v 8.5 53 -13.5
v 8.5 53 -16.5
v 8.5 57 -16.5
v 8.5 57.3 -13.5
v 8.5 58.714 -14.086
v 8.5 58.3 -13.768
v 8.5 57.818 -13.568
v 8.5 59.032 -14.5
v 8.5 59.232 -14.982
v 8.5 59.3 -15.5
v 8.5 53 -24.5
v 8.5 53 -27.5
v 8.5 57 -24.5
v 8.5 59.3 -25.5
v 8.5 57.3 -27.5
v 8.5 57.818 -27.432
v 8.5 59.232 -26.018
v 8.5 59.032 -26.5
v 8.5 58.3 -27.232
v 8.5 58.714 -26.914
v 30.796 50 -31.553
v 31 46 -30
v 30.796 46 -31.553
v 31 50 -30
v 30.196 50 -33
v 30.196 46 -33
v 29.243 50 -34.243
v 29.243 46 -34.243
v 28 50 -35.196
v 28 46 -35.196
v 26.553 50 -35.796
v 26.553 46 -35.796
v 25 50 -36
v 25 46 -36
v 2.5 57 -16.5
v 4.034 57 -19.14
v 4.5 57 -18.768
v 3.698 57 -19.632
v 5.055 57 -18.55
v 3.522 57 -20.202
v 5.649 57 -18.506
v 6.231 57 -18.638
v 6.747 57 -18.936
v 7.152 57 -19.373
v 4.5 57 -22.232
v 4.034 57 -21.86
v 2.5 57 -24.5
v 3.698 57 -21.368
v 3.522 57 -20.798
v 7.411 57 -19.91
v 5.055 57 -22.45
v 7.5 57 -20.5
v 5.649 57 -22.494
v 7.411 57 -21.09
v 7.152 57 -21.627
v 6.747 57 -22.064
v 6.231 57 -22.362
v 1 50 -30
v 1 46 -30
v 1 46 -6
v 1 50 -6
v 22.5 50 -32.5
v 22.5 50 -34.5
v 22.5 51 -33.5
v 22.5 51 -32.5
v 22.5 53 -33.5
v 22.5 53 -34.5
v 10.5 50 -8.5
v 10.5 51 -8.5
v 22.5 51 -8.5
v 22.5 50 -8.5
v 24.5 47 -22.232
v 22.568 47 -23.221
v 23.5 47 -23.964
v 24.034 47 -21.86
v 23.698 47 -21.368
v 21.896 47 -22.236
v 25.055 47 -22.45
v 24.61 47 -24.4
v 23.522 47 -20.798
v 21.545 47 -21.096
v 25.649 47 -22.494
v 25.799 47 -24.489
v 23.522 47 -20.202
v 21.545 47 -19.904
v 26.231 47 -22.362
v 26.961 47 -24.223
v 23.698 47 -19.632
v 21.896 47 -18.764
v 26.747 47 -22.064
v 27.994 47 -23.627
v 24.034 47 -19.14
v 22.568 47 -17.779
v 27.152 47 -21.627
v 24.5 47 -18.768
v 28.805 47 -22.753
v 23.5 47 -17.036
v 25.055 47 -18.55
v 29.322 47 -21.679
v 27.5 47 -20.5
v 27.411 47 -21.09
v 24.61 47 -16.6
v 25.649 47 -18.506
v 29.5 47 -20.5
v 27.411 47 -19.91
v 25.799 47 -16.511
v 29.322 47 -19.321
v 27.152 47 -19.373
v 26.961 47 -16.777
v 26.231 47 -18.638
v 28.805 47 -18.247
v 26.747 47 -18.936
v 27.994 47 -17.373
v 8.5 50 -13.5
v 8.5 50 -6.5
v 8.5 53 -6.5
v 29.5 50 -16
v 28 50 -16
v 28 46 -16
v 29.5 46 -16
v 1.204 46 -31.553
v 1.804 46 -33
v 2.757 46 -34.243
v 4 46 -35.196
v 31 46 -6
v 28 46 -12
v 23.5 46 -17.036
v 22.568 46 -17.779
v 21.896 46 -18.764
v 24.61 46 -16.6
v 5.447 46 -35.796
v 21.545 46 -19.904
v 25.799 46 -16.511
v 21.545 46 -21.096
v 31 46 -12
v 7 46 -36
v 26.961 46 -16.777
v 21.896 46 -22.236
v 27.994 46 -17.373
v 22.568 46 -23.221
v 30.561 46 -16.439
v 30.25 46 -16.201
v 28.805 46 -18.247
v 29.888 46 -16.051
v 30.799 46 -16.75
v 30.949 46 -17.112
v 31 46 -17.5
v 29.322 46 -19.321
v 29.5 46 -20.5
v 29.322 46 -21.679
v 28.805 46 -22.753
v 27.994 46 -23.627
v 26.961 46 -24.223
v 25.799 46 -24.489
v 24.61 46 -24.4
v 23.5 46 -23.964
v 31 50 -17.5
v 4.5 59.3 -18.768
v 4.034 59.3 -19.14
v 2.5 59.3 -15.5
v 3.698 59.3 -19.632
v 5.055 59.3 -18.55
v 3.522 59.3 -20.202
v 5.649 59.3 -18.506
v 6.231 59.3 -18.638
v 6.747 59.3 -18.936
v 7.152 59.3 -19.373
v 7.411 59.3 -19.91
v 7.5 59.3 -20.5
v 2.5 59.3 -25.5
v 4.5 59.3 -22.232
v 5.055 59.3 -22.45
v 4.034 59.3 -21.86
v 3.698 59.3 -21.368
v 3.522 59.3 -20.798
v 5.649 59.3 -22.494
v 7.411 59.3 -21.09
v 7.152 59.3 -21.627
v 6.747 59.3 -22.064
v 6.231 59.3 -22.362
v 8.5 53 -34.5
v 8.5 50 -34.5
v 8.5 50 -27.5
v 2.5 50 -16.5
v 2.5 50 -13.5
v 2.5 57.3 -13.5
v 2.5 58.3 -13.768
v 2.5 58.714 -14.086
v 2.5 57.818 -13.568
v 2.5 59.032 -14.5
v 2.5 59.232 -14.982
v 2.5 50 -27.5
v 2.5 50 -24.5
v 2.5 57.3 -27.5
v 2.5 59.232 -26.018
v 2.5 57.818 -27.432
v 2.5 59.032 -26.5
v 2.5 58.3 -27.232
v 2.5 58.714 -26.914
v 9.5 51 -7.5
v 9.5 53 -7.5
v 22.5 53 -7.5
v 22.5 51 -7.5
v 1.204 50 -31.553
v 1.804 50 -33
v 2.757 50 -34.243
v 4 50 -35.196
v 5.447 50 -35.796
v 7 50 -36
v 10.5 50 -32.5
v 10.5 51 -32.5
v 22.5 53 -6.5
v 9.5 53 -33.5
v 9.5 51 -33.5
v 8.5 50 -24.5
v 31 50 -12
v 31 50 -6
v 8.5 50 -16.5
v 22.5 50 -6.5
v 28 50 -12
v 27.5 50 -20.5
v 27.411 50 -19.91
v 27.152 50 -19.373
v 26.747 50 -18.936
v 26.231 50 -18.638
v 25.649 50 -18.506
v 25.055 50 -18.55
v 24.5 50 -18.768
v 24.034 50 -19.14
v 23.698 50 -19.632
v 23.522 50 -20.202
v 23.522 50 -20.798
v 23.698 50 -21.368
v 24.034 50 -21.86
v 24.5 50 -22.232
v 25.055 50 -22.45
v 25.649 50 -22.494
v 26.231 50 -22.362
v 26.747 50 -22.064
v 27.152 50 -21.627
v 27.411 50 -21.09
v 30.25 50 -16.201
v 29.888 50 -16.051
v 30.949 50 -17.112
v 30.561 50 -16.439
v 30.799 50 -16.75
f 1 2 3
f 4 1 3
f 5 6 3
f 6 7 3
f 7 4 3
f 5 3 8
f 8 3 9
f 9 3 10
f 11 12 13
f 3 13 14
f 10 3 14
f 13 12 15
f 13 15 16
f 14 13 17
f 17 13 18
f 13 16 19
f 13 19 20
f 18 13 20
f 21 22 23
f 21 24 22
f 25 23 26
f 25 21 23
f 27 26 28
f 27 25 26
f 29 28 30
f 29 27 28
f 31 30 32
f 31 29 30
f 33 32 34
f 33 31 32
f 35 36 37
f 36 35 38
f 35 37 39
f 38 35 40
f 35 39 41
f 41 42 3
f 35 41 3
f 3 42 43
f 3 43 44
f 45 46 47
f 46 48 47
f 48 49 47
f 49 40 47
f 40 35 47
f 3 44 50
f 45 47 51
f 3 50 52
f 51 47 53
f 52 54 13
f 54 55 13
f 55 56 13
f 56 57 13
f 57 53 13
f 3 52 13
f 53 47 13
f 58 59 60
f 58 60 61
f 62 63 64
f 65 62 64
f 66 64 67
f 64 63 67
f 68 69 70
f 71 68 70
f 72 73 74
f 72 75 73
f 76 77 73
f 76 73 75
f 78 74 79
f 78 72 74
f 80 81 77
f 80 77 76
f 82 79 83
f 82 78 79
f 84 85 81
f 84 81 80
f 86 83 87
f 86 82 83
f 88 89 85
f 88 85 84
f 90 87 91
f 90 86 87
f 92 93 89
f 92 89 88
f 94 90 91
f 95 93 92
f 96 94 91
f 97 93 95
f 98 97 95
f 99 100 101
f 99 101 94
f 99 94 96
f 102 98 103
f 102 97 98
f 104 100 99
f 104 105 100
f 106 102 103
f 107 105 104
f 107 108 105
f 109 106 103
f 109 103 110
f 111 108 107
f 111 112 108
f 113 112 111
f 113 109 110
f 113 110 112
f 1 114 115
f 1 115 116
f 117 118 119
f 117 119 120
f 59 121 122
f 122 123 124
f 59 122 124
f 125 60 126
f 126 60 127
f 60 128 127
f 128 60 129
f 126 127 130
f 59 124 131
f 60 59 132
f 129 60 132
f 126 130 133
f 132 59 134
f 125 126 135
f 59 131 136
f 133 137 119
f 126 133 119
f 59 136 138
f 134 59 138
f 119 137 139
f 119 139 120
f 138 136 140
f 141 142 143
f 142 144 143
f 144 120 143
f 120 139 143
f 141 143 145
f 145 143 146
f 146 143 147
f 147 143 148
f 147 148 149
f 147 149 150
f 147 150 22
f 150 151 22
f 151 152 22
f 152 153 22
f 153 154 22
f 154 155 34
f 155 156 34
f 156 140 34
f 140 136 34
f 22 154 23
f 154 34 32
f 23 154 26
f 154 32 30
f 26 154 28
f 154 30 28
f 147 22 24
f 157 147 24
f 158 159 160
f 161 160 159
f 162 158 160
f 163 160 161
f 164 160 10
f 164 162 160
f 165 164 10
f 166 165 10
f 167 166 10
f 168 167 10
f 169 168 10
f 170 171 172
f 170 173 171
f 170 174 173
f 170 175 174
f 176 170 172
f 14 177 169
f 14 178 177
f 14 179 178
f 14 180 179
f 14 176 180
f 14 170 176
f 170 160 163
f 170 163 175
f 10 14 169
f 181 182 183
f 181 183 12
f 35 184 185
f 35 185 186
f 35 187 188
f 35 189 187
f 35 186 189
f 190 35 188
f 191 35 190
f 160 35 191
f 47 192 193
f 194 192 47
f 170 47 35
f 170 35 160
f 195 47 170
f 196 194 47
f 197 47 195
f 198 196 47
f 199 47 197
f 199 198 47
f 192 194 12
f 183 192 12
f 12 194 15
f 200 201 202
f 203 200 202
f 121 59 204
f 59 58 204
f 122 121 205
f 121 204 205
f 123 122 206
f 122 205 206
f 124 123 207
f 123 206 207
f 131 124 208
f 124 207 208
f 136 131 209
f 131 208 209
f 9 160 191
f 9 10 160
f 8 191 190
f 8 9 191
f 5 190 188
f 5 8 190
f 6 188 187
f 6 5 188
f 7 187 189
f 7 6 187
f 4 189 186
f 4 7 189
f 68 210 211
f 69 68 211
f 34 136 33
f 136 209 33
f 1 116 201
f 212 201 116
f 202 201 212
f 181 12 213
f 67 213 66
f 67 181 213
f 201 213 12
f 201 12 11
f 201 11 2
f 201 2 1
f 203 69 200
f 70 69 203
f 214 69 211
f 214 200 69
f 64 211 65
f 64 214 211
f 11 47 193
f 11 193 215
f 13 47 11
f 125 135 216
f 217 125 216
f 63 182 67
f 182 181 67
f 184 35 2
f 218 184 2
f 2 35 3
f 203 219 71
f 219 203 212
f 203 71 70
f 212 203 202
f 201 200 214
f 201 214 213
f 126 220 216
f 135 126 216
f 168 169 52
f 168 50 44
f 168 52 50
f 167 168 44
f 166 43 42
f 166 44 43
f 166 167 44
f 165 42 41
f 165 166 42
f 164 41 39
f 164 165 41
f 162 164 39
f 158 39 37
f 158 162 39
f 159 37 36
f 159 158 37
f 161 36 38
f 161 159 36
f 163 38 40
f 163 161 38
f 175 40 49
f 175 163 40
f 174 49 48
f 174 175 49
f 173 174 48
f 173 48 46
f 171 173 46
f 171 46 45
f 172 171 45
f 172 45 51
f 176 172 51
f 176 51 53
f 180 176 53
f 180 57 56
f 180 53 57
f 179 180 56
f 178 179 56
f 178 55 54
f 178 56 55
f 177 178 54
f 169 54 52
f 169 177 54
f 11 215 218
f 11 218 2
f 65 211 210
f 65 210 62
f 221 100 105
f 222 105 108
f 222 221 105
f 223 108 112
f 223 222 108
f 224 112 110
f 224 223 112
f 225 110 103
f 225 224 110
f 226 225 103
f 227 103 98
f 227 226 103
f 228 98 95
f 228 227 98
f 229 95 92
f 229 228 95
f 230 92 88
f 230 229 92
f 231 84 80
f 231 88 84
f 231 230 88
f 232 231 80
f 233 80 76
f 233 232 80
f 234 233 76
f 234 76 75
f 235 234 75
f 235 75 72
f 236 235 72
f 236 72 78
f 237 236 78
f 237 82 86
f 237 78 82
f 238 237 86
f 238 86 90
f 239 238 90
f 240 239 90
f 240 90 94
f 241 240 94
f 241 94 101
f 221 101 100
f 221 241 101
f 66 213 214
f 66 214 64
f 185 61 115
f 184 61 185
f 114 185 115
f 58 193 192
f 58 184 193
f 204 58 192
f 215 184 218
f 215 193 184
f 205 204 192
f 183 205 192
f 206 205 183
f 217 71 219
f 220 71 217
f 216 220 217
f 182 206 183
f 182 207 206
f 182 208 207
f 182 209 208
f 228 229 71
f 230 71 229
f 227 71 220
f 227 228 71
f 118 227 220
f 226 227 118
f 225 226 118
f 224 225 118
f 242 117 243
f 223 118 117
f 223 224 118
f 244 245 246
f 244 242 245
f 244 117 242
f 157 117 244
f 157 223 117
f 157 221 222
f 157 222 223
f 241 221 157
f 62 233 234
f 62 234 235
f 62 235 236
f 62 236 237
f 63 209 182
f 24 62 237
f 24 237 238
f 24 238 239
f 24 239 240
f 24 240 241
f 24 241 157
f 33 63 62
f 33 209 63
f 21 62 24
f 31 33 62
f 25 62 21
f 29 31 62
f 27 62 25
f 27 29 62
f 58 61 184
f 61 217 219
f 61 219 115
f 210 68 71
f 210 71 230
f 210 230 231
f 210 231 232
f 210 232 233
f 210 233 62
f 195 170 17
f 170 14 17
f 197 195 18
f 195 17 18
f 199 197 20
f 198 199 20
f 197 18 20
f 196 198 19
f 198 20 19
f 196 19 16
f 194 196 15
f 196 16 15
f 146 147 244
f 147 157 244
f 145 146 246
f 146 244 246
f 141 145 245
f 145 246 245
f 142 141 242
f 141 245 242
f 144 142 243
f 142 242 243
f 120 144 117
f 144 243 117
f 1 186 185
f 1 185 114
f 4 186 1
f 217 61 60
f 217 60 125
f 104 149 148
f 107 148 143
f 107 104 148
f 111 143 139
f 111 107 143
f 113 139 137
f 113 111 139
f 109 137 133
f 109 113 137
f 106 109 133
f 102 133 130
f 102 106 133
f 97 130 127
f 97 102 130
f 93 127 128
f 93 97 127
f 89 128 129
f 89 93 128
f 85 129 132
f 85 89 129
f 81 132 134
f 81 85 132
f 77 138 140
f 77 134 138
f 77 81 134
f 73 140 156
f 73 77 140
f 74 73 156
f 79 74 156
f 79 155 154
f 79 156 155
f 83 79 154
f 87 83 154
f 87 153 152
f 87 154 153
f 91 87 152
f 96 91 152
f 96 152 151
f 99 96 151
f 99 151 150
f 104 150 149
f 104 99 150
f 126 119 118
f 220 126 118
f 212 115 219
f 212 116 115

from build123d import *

# Parameters (mm, degrees)
BOX227_W          = 10
BOX227_H          = 10
BOX227_DEPTH      = 4
BOX217_W          = 13
BOX217_H          = 2
BOX217_DEPTH      = 1
BOX213_W          = 1
BOX213_H          = 2
BOX213_DEPTH      = 28
BOX210_W          = 2
BOX210_H          = 1
BOX210_DEPTH      = 28
BOX215_W          = 13
BOX215_H          = 2
BOX215_DEPTH      = 1
BOX212_W          = 12
BOX212_H          = 1
BOX212_DEPTH      = 2
BOX211_W          = 12
BOX211_H          = 1
BOX211_DEPTH      = 2
CYLINDER092_R     = 2
CYLINDER092_DEPTH = 5
CYLINDER093_R     = 4
CYLINDER093_DEPTH = 5
BOX073_W          = 30
BOX073_H          = 4
BOX073_DEPTH      = 30
FILLET057_R       = 6
CYLINDER088_R     = 2
CYLINDER088_DEPTH = 5
BOX221_W          = 6
BOX221_H          = 2.3
BOX221_DEPTH      = 14
FILLET055_R       = 2
BOX209_W          = 6
BOX209_H          = 7
BOX209_DEPTH      = 3
BOX222_W          = 6
BOX222_H          = 7
BOX222_DEPTH      = 3
FILLET059_R       = 1.5


with BuildPart() as cube215:
    # Box227 → Box227 (new body)
    with BuildSketch(Plane(origin=(28, 40, -16), x_dir=(1, 0, 0), z_dir=(0, 0, 1))):
        with Locations((5, 5)):
            Rectangle(BOX227_W, BOX227_H)
    extrude(amount=BOX227_DEPTH)


with BuildPart() as cube206:
    # Box217 → Box217 (new body)
    with BuildSketch(Plane(origin=(9.5, 51, -34.5), x_dir=(1, 0, 0), z_dir=(0, 0, 1))):
        with Locations((6.5, 1)):
            Rectangle(BOX217_W, BOX217_H)
    extrude(amount=BOX217_DEPTH)


with BuildPart() as cube202:
    # Box213 → Box213 (new body)
    with BuildSketch(Plane(origin=(8.5, 51, -34.5), x_dir=(1, 0, 0), z_dir=(0, 0, 1))):
        with Locations((0.5, 1)):
            Rectangle(BOX213_W, BOX213_H)
    extrude(amount=BOX213_DEPTH)


with BuildPart() as cube199:
    # Box210 → Box210 (new body)
    with BuildSketch(Plane(origin=(8.5, 50, -34.5), x_dir=(1, 0, 0), z_dir=(0, 0, 1))):
        with Locations((1, 0.5)):
            Rectangle(BOX210_W, BOX210_H)
    extrude(amount=BOX210_DEPTH)


with BuildPart() as cube204:
    # Box215 → Box215 (new body)
    with BuildSketch(Plane(origin=(9.5, 51, -7.5), x_dir=(1, 0, 0), z_dir=(0, 0, 1))):
        with Locations((6.5, 1)):
            Rectangle(BOX215_W, BOX215_H)
    extrude(amount=BOX215_DEPTH)


with BuildPart() as cube201:
    # Box212 → Box212 (new body)
    with BuildSketch(Plane(origin=(10.5, 50, -8.5), x_dir=(1, 0, 0), z_dir=(0, 0, 1))):
        with Locations((6, 0.5)):
            Rectangle(BOX212_W, BOX212_H)
    extrude(amount=BOX212_DEPTH)


with BuildPart() as fusion070:
    # Box211 → Box211 (new body)
    with BuildSketch(Plane(origin=(10.5, 50, -34.5), x_dir=(1, 0, 0), z_dir=(0, 0, 1))):
        with Locations((6, 0.5)):
            Rectangle(BOX211_W, BOX211_H)
    extrude(amount=BOX211_DEPTH)

    # Fusion070: union Cube206, Cube202, Cube199, Cube204, Cube201
    add(cube206.part)
    add(cube202.part)
    add(cube199.part)
    add(cube204.part)
    add(cube201.part)


with BuildPart() as cylinder173:
    # Cylinder092 → Cylinder092 (new body)
    with BuildSketch(Plane(origin=(25.5, 50, -20.5), x_dir=(1, 0, 0), z_dir=(0, -1, 0))):
        Circle(CYLINDER092_R)
    extrude(amount=CYLINDER092_DEPTH)


with BuildPart() as cylinder174:
    # Cylinder093 → Cylinder093 (new body)
    with BuildSketch(Plane(origin=(25.5, 47, -20.5), x_dir=(1, 0, 0), z_dir=(0, -1, 0))):
        Circle(CYLINDER093_R)
    extrude(amount=CYLINDER093_DEPTH)


with BuildPart() as cut118:
    # Box073 → Box073 (new body)
    with BuildSketch(Plane(origin=(1, 46, -36), x_dir=(1, 0, 0), z_dir=(0, 0, 1))):
        with Locations((15, 2)):
            Rectangle(BOX073_W, BOX073_H)
    extrude(amount=BOX073_DEPTH)

    # Fillet057
    fillet057_edges = [cut118.edges().sort_by_distance(p)[0] for p in [
        (1, 48, -36),
        (31, 48, -36),
    ]]
    fillet(fillet057_edges, radius=FILLET057_R)

    # Cut117: cut Cylinder174
    add(cylinder174.part, mode=Mode.SUBTRACT)

    # Cut118: cut Cylinder173
    add(cylinder173.part, mode=Mode.SUBTRACT)


with BuildPart() as cylinder169:
    # Cylinder088 → Cylinder088 (new body)
    with BuildSketch(Plane(origin=(5.5, 60, -20.5), x_dir=(1, 0, 0), z_dir=(0, -1, 0))):
        Circle(CYLINDER088_R)
    extrude(amount=CYLINDER088_DEPTH)


with BuildPart() as fillet055:
    # Box221 → Box221 (new body)
    with BuildSketch(Plane(origin=(2.5, 57, -27.5), x_dir=(1, 0, 0), z_dir=(0, 0, 1))):
        with Locations((3, 1.15)):
            Rectangle(BOX221_W, BOX221_H)
    extrude(amount=BOX221_DEPTH)

    # Cut112: cut Cylinder169
    add(cylinder169.part, mode=Mode.SUBTRACT)

    # Fillet055
    fillet055_edges = [fillet055.edges().sort_by_distance(p)[0] for p in [
        (5.5, 59.3, -13.5),
        (5.5, 59.3, -27.5),
    ]]
    fillet(fillet055_edges, radius=FILLET055_R)


with BuildPart() as cube198:
    # Box209 → Box209 (new body)
    with BuildSketch(Plane(origin=(2.5, 50, -16.5), x_dir=(1, 0, 0), z_dir=(0, 0, 1))):
        with Locations((3, 3.5)):
            Rectangle(BOX209_W, BOX209_H)
    extrude(amount=BOX209_DEPTH)


with BuildPart() as fillet059:
    # Box222 → Box222 (new body)
    with BuildSketch(Plane(origin=(2.5, 50, -27.5), x_dir=(1, 0, 0), z_dir=(0, 0, 1))):
        with Locations((3, 3.5)):
            Rectangle(BOX222_W, BOX222_H)
    extrude(amount=BOX222_DEPTH)

    # Fusion068: union Fillet055, Cube198
    add(fillet055.part)
    add(cube198.part)

    # Fusion072: union Fusion070, Cut118
    add(fusion070.part)
    add(cut118.part)

    # Cut119: cut Cube215
    add(cube215.part, mode=Mode.SUBTRACT)

    # Fillet059
    fillet059_edges = [fillet059.edges().sort_by_distance(p)[0] for p in [
        (31, 48, -16),
    ]]
    fillet(fillet059_edges, radius=FILLET059_R)


solid = fillet059.part
